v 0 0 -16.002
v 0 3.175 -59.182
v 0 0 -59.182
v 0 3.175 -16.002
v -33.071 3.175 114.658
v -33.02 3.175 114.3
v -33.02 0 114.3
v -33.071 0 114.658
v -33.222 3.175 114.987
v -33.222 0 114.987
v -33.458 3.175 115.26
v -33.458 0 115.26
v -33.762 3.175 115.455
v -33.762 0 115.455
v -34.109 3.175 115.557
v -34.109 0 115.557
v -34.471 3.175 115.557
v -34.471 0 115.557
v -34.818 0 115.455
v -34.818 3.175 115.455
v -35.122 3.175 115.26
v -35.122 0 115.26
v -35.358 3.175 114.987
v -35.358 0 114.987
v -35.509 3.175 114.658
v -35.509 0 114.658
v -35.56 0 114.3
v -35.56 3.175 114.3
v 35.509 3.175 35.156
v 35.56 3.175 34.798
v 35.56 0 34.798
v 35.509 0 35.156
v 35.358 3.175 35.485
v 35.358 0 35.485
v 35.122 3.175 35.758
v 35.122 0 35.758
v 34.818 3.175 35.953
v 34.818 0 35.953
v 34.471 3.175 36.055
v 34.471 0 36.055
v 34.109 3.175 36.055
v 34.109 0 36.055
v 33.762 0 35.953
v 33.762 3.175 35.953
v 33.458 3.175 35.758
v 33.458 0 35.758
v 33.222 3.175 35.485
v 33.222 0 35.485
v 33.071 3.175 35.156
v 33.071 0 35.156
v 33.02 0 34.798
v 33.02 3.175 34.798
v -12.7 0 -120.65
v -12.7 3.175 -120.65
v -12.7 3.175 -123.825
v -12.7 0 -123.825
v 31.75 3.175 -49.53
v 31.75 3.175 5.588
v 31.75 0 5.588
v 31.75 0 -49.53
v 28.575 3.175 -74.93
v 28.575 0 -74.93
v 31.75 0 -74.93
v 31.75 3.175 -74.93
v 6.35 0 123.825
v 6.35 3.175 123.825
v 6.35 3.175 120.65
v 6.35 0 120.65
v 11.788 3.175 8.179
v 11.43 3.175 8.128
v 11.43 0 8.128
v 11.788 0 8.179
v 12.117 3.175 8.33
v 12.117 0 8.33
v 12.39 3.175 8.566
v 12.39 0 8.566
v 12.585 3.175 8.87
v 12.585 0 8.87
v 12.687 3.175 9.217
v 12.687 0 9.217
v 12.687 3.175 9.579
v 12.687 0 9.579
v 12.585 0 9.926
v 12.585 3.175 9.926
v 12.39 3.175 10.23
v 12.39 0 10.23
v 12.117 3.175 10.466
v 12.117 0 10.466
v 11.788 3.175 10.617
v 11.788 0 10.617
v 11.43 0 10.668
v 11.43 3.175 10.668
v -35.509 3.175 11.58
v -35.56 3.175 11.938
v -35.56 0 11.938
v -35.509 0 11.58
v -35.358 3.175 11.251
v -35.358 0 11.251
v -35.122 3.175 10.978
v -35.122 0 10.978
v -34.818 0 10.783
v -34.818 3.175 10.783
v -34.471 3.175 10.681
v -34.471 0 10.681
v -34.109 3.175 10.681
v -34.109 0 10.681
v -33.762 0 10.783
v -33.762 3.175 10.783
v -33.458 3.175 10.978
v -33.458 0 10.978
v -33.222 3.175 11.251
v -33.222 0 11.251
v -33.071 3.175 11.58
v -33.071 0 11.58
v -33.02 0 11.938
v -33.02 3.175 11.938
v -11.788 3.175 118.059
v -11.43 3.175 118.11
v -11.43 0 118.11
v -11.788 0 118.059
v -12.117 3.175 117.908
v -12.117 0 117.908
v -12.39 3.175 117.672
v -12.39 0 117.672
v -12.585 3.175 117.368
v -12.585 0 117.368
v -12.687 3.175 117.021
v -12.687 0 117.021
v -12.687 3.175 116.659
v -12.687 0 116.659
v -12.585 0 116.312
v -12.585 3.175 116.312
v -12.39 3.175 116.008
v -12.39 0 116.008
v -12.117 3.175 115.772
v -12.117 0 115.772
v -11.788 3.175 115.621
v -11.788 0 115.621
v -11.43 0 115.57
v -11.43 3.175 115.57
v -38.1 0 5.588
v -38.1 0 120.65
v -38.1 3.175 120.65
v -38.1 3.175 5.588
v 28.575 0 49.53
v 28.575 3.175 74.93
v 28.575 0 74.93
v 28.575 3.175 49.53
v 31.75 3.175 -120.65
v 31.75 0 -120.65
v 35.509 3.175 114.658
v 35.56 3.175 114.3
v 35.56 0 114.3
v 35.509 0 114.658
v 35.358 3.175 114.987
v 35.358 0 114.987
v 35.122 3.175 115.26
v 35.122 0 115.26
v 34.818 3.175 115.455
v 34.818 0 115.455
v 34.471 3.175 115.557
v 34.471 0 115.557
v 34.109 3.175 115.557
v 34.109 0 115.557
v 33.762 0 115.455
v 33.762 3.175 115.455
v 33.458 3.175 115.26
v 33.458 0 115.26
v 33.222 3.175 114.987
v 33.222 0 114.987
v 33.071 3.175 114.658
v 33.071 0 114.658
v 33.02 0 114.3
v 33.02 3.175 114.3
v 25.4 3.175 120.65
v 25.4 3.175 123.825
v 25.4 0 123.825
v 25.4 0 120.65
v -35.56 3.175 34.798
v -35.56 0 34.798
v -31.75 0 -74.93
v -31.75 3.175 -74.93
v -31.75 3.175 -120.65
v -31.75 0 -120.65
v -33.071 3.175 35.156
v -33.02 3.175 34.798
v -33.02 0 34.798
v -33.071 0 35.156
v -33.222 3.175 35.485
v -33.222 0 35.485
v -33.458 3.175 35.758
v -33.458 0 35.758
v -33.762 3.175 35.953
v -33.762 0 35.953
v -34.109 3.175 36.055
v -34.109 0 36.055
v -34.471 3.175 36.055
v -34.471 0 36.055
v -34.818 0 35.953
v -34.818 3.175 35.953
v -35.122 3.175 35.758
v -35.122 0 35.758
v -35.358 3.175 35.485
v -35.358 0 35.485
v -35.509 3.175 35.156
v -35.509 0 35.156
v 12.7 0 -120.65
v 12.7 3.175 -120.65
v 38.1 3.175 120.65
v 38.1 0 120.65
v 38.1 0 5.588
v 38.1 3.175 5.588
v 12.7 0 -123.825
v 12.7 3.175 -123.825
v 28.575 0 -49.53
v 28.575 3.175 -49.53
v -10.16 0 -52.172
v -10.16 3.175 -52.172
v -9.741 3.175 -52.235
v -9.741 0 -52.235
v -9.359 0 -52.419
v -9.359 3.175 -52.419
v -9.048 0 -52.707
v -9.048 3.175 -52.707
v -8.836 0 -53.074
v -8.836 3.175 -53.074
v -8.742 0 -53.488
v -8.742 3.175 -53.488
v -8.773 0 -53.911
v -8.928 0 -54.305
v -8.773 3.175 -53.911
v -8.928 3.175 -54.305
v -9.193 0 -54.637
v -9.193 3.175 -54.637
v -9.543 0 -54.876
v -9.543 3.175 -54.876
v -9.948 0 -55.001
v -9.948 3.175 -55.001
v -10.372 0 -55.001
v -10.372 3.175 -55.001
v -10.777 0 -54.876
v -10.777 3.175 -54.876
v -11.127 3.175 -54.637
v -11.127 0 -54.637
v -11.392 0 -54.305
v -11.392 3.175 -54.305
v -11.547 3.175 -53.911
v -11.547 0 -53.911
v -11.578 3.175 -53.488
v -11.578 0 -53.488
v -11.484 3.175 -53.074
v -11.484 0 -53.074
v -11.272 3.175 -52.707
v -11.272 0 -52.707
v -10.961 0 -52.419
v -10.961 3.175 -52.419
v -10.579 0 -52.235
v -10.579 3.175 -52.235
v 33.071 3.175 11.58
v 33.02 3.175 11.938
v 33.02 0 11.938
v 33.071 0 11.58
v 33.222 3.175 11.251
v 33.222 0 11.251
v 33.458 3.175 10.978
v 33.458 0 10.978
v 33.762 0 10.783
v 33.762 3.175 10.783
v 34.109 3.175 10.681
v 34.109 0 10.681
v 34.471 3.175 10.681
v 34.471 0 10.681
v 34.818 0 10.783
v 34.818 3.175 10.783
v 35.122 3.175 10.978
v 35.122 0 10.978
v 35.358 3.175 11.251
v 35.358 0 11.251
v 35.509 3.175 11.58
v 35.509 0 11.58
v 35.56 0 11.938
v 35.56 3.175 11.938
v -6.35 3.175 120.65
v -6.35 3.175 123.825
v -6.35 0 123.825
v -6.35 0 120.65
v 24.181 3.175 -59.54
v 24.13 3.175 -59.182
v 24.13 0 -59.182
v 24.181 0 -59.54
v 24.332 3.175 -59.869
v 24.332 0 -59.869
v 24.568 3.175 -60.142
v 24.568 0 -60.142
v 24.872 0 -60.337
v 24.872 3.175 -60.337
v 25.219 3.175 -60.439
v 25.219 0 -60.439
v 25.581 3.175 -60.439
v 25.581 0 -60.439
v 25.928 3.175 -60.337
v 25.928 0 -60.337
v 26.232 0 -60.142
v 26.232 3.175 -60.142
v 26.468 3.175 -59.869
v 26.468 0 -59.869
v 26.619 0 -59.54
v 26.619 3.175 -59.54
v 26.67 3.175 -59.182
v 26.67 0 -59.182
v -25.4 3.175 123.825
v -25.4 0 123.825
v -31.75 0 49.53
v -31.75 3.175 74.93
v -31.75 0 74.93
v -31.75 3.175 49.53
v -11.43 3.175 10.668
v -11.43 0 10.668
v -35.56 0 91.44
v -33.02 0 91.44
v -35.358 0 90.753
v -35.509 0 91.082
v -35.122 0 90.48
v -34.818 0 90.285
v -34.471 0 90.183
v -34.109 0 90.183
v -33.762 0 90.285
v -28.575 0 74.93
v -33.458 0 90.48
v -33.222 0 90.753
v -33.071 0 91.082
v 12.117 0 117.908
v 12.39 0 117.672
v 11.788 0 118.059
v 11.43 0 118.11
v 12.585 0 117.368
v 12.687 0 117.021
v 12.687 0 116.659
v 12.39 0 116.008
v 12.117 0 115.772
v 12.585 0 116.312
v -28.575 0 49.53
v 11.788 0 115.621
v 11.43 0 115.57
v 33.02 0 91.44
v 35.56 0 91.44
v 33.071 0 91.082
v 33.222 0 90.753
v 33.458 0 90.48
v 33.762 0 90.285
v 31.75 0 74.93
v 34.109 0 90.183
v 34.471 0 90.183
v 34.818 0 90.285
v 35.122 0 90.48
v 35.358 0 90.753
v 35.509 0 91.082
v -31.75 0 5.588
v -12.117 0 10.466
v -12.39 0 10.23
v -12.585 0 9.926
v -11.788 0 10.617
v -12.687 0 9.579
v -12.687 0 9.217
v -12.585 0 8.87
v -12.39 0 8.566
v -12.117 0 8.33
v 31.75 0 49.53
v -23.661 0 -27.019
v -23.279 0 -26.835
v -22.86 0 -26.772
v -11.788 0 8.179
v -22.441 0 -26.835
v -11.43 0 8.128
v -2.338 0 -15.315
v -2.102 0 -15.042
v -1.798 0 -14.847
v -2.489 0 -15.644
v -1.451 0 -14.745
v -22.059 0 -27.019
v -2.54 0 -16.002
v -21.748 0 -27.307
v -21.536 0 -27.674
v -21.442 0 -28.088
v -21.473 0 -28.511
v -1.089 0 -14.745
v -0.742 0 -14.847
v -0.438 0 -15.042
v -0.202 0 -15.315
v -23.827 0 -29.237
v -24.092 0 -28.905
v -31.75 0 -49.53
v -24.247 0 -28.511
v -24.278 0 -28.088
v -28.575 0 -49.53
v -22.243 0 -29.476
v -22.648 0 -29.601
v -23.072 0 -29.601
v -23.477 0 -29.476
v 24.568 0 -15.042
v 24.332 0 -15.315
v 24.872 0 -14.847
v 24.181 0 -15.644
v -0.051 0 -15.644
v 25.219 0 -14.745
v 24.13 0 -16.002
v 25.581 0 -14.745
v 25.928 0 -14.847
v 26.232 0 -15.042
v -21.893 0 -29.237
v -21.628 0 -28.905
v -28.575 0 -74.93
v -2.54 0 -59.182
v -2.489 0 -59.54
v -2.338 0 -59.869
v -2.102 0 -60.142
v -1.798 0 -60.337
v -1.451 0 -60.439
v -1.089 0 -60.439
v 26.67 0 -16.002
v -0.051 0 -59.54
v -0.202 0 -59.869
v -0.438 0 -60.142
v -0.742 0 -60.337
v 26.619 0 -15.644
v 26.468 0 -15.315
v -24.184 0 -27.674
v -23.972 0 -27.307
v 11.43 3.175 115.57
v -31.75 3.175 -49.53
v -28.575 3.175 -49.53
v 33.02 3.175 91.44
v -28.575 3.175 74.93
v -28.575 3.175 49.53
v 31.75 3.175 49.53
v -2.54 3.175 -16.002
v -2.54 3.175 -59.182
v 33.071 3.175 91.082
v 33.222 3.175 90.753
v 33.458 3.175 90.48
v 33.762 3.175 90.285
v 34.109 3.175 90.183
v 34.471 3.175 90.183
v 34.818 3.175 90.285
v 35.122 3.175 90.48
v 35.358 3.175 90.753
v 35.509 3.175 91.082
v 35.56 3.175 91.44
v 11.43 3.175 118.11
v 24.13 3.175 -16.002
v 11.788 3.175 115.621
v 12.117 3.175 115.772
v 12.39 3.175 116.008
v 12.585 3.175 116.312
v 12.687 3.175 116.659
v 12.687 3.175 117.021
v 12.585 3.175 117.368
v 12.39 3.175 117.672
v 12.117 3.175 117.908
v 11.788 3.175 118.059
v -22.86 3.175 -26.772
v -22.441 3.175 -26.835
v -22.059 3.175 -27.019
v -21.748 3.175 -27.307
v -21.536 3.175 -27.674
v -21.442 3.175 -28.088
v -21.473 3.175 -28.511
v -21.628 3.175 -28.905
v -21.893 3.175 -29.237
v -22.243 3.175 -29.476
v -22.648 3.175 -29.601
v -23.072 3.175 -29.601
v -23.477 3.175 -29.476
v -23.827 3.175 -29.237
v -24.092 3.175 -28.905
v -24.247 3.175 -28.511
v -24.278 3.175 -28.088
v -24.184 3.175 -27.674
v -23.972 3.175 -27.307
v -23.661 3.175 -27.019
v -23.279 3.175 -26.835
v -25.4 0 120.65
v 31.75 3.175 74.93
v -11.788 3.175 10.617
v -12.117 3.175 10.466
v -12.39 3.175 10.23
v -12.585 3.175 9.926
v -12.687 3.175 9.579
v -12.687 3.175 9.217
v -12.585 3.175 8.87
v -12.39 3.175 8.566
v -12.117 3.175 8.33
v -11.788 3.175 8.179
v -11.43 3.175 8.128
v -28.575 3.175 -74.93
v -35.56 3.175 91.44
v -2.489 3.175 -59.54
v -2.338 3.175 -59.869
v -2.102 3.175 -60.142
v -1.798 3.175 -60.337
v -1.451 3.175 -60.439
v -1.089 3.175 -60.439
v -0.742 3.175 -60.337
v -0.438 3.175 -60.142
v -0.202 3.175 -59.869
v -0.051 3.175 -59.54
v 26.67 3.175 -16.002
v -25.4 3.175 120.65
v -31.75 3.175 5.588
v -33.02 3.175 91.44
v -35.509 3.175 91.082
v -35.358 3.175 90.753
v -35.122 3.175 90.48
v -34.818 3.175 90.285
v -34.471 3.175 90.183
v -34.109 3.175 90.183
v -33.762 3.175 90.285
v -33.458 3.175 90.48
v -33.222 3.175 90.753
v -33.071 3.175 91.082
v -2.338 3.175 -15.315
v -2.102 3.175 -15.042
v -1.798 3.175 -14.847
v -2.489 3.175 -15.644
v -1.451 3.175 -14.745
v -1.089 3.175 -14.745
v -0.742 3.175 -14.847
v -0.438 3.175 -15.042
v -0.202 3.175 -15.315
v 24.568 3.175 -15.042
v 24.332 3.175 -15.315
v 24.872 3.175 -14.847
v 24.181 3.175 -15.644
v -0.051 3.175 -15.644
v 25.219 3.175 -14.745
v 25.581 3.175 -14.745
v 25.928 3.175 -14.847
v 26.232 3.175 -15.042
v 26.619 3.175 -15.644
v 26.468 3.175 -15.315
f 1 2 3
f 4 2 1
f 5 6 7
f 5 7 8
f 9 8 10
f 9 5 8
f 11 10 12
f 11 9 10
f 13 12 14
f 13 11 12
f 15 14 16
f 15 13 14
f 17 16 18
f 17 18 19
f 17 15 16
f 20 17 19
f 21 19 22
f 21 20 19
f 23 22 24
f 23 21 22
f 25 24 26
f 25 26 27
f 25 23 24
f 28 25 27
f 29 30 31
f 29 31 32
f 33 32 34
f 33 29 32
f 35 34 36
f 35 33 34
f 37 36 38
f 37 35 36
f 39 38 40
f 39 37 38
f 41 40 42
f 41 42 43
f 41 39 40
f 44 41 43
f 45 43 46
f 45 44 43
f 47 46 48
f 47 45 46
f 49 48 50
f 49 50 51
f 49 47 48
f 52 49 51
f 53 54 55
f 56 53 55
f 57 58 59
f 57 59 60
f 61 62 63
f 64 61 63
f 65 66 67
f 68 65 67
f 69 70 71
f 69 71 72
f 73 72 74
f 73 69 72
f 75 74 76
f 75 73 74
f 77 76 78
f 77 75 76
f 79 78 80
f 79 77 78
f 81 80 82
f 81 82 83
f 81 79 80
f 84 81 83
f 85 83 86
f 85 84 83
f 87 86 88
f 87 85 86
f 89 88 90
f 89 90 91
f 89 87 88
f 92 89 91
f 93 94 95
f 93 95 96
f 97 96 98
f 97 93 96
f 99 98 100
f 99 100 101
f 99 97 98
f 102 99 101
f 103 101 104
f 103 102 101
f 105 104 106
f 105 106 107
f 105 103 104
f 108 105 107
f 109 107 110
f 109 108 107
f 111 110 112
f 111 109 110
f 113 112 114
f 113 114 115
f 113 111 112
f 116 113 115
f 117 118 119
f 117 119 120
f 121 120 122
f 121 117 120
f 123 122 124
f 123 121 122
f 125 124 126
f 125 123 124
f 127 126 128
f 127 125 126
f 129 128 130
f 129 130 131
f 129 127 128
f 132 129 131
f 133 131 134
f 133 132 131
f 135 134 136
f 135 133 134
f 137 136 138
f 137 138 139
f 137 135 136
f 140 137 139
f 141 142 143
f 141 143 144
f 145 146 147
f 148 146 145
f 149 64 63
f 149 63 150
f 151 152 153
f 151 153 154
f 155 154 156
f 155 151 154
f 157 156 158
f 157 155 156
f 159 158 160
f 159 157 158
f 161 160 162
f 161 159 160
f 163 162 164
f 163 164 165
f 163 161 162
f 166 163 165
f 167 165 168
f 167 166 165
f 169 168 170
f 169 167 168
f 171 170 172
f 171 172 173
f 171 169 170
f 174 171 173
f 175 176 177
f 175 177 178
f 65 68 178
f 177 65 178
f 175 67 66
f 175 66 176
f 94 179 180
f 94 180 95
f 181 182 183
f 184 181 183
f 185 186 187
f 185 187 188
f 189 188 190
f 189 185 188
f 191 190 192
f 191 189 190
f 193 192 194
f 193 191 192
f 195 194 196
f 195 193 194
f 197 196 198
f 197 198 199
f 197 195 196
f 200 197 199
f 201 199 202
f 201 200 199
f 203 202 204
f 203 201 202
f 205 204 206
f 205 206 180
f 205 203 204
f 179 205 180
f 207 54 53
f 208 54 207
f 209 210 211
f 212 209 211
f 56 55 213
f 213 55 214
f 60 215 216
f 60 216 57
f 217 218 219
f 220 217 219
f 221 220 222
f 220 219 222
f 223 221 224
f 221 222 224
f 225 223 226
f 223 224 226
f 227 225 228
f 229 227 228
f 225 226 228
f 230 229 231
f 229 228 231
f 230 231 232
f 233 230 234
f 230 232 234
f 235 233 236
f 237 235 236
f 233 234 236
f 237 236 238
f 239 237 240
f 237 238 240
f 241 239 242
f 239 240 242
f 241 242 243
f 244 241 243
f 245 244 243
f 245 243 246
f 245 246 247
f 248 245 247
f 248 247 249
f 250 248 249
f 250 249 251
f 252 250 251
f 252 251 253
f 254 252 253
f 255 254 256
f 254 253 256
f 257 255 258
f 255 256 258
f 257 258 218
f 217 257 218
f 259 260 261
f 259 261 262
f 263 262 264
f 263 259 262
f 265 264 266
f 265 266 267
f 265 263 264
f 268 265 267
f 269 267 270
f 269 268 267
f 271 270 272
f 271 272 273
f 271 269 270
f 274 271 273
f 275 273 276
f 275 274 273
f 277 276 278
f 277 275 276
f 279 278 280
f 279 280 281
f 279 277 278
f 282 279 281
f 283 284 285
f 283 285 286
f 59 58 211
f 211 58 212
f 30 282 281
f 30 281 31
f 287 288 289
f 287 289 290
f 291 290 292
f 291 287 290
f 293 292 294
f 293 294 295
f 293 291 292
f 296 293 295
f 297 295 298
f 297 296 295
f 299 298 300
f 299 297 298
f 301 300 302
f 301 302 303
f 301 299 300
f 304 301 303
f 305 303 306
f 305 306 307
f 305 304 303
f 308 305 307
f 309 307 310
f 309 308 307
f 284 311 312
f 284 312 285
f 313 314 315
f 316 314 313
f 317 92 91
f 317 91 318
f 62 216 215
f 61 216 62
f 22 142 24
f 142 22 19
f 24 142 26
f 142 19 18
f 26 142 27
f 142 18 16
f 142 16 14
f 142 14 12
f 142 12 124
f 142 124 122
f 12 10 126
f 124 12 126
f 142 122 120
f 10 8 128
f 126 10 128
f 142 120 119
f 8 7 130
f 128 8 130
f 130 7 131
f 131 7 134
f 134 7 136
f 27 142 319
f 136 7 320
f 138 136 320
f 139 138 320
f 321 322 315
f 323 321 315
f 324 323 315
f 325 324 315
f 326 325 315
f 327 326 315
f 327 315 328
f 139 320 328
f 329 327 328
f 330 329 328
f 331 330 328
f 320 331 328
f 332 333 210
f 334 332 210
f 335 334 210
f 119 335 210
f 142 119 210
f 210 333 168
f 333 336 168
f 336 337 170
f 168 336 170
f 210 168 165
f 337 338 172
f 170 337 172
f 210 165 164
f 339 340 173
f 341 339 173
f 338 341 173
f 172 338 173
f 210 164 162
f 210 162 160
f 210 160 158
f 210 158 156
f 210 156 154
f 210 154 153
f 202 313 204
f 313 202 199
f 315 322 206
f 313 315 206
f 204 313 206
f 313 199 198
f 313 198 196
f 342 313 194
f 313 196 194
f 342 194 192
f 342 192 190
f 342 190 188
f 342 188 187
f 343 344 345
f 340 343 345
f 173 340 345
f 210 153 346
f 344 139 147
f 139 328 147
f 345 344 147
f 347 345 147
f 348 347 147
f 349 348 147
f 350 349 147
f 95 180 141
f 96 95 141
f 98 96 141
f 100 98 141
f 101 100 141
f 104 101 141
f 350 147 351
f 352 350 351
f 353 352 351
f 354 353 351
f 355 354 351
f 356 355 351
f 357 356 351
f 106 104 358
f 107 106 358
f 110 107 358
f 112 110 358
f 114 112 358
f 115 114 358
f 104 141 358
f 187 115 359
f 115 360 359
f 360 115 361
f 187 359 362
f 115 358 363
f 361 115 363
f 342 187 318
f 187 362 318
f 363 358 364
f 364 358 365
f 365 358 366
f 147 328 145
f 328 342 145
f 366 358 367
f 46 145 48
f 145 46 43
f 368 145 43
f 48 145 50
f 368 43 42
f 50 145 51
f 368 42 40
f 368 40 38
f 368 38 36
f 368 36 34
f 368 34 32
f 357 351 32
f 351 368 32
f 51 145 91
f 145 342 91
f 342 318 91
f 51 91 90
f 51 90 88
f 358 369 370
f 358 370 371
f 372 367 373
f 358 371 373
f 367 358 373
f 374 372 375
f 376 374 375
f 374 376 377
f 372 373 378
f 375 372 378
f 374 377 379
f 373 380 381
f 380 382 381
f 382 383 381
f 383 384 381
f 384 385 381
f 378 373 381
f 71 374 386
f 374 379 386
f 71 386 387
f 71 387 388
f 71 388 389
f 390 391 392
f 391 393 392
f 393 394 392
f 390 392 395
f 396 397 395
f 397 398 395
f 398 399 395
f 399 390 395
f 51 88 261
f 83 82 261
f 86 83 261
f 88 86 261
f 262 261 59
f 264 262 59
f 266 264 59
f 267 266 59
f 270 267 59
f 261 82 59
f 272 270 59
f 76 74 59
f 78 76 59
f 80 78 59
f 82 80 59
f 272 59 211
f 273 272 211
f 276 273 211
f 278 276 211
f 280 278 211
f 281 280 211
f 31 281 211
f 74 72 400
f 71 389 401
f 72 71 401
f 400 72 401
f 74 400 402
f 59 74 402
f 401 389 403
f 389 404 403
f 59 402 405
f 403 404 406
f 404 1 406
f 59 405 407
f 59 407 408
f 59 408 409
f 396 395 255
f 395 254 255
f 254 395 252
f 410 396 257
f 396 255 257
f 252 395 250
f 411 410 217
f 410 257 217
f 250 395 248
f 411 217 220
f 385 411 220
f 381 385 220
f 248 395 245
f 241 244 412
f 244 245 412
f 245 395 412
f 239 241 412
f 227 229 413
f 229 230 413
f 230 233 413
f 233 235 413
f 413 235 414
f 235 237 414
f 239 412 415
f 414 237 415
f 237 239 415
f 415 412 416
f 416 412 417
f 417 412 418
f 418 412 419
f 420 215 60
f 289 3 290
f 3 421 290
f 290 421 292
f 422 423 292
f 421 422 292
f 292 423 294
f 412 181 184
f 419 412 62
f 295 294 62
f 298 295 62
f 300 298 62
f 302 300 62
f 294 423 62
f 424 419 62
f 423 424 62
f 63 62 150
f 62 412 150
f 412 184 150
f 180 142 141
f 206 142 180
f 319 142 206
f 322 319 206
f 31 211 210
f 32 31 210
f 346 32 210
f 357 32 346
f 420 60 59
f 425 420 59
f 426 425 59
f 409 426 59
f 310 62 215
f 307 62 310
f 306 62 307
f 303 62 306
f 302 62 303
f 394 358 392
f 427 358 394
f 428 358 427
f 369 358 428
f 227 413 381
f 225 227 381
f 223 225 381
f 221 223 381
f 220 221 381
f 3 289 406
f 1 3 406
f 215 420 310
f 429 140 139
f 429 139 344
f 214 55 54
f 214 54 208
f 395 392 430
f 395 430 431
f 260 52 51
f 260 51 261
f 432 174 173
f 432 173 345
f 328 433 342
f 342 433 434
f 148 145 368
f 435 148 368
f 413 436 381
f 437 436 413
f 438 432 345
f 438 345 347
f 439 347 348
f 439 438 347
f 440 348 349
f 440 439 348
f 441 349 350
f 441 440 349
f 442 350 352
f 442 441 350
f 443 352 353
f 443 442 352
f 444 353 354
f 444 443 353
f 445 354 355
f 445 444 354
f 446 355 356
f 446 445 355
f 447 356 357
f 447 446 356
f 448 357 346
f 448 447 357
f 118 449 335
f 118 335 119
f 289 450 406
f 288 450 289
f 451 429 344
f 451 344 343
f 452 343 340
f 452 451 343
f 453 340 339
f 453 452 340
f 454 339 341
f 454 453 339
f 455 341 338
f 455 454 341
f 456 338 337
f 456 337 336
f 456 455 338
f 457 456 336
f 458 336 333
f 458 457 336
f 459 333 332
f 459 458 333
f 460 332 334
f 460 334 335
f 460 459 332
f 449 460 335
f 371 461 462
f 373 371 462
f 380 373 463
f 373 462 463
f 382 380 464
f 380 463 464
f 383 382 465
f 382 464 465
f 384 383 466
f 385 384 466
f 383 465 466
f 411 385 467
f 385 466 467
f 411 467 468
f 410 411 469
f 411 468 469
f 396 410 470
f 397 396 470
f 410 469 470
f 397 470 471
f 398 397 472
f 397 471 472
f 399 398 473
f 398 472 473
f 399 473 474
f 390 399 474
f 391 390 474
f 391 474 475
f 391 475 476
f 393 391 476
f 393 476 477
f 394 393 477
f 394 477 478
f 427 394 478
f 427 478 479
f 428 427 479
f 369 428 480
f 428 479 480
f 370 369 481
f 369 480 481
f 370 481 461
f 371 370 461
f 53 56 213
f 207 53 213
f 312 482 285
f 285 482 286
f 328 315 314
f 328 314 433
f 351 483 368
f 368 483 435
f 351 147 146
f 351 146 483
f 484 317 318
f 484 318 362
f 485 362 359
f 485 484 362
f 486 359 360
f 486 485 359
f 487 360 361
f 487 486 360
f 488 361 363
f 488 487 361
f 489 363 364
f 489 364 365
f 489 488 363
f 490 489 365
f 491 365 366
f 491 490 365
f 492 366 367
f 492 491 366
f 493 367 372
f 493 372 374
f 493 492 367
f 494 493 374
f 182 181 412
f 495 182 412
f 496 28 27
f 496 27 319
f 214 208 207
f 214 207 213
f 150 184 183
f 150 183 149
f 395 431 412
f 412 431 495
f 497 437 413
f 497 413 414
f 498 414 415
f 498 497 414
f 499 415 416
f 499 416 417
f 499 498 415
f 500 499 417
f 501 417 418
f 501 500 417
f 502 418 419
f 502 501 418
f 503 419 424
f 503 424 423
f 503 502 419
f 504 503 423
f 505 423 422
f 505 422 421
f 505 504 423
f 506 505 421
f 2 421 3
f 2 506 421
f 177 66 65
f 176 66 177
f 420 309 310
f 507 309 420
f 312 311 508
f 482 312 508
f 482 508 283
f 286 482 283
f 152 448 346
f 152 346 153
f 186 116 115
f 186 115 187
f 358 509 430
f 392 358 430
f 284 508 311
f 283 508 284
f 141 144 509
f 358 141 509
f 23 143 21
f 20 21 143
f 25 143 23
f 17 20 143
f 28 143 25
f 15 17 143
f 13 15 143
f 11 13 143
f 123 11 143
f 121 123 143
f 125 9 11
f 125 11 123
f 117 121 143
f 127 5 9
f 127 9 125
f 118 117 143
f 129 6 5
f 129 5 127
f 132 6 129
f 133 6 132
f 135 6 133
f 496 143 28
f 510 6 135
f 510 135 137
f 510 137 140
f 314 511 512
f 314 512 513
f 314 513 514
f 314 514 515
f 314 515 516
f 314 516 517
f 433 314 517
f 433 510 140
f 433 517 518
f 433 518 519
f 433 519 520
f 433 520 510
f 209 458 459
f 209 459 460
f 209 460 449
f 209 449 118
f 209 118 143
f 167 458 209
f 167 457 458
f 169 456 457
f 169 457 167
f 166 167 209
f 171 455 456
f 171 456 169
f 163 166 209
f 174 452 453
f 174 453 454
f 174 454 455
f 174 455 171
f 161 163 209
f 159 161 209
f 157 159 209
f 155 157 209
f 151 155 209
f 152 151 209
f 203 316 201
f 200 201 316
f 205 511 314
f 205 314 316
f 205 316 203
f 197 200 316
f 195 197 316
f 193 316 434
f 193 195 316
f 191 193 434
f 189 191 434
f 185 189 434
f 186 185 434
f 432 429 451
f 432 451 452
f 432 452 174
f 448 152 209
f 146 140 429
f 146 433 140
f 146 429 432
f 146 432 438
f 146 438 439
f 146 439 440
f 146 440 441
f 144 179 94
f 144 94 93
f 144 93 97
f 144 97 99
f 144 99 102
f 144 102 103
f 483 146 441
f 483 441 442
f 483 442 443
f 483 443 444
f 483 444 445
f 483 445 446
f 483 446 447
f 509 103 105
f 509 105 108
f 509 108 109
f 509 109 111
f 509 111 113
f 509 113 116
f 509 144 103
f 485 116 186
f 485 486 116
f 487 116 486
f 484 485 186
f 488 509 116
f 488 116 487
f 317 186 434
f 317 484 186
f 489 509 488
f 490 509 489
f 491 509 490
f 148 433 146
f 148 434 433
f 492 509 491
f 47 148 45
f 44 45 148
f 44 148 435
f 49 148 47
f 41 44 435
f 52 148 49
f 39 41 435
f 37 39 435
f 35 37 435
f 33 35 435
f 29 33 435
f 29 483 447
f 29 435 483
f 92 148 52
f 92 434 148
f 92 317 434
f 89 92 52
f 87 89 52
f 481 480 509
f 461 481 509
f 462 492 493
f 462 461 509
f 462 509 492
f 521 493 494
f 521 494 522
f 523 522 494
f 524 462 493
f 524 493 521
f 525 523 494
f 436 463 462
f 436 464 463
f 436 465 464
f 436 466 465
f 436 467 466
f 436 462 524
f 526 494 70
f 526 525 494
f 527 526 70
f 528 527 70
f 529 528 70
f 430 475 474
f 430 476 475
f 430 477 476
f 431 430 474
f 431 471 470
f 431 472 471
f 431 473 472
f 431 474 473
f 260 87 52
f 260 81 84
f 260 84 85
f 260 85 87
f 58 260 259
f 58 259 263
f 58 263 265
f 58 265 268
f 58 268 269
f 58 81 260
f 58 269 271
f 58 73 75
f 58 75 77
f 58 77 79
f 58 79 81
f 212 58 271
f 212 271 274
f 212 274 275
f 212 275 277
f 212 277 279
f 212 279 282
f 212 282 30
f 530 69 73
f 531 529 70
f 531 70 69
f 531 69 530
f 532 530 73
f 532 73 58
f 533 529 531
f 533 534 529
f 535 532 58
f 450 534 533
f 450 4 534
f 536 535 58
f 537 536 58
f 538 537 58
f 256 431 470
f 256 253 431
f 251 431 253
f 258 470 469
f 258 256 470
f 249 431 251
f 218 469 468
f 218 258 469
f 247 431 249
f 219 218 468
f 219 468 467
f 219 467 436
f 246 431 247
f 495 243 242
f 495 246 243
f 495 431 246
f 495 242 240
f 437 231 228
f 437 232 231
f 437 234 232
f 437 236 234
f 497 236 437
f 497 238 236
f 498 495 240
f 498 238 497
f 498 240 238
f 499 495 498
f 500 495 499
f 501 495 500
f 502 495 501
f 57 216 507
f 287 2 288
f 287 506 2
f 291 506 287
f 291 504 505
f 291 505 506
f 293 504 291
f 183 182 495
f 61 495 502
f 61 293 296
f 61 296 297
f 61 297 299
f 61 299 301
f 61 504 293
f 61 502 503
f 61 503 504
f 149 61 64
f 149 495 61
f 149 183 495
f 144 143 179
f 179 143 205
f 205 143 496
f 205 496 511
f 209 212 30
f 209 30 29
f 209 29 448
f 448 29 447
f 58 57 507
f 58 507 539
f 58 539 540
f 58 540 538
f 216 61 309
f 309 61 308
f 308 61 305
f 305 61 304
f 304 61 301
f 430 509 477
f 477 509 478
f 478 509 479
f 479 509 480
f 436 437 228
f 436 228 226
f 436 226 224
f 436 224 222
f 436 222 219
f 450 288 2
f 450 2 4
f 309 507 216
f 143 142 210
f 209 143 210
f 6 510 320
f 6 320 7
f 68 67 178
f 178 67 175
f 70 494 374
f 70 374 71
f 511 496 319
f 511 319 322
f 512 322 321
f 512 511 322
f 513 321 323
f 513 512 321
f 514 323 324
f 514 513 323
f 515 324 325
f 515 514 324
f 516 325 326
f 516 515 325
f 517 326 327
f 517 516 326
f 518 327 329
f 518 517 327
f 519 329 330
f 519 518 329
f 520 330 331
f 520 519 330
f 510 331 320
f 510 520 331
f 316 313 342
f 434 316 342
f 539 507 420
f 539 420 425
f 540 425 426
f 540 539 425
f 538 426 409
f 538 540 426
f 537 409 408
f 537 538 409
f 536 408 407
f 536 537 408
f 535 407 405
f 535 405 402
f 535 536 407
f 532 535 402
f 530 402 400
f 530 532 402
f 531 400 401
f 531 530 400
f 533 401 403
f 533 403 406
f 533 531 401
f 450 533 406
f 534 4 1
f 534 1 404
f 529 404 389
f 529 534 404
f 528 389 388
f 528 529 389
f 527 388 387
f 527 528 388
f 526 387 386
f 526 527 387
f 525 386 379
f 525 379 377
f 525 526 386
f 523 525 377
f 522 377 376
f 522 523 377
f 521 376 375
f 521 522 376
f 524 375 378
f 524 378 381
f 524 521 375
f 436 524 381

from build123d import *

# Parameters (mm, degrees)
SKETCH1_W             = 76.2
SKETCH1_H             = 241.3
BOSS_EXTRUDE1_DEPTH   = 3.175
SKETCH5_W             = 6.35
SKETCH5_H             = 126.238
CUT_EXTRUDE11_DEPTH   = 3.175
SKETCH5_4_W           = 6.35
SKETCH5_4_H           = 126.238
CUT_EXTRUDE12_DEPTH   = 3.175
SKETCH7_W             = 3.175
SKETCH7_H             = 25.4
CUT_EXTRUDE13_DEPTH   = 3.175
SKETCH7_3_W           = 3.175
SKETCH7_3_H           = 25.4
CUT_EXTRUDE14_DEPTH   = 3.175
SKETCH8_W             = 19.05
SKETCH8_H             = 3.175
BOSS_EXTRUDE2_DEPTH   = 3.175
BOSS_EXTRUDE2_2_DEPTH = 3.175
SKETCH8_W_2           = 25.4
BOSS_EXTRUDE2_3_DEPTH = 3.175
CUT_EXTRUDE15_DEPTH   = 3.175
SKETCH10_R            = 1.4224
CUT_EXTRUDE16_DEPTH   = 3.175


with BuildPart() as part:
    # Sketch1 → Boss-Extrude1 (new body)
    with BuildSketch(Plane(origin=(0, 0, 0), x_dir=(1, 0, 0), z_dir=(0, 1, 0))):
        Rectangle(SKETCH1_W, SKETCH1_H)
    extrude(amount=BOSS_EXTRUDE1_DEPTH)

    # Sketch5 → Cut-Extrude11 (cut)
    with BuildSketch(Plane(origin=(0, 3.175, 0), x_dir=(1, 0, 0), z_dir=(0, 1, 0))):
        with Locations((-34.925, 57.531)):
            Rectangle(SKETCH5_W, SKETCH5_H)
    extrude(amount=-CUT_EXTRUDE11_DEPTH, mode=Mode.SUBTRACT)

    # Sketch5<4> → Cut-Extrude12 (cut)
    with BuildSketch(Plane(origin=(0, 3.175, 0), x_dir=(1, 0, 0), z_dir=(0, 1, 0))):
        with Locations((34.925, 57.531)):
            Rectangle(SKETCH5_4_W, SKETCH5_4_H)
    extrude(amount=-CUT_EXTRUDE12_DEPTH, mode=Mode.SUBTRACT)

    # Sketch7 → Cut-Extrude13 (cut)
    with BuildSketch(Plane(origin=(0, 3.175, 0), x_dir=(1, 0, 0), z_dir=(0, 1, 0))):
        with Locations((-30.1625, -62.23)):
            Rectangle(SKETCH7_W, SKETCH7_H)
    extrude(amount=-CUT_EXTRUDE13_DEPTH, mode=Mode.SUBTRACT)

    # Sketch7<3> → Cut-Extrude14 (cut)
    with BuildSketch(Plane(origin=(0, 3.175, 0), x_dir=(1, 0, 0), z_dir=(0, 1, 0))):
        with Locations((-30.1625, -62.23)):
            Rectangle(SKETCH7_3_W, SKETCH7_3_H)
        with Locations((30.1625, -62.23)):
            Rectangle(SKETCH7_3_W, SKETCH7_3_H)
        with Locations((-30.1625, 62.23)):
            Rectangle(SKETCH7_3_W, SKETCH7_3_H)
        with Locations((30.1625, 62.23)):
            Rectangle(SKETCH7_3_W, SKETCH7_3_H)
    extrude(amount=-CUT_EXTRUDE14_DEPTH, mode=Mode.SUBTRACT)

    # Sketch9 → Cut-Extrude15 (cut)
    with BuildSketch(Plane(origin=(0, 3.175, 0), x_dir=(1, 0, 0), z_dir=(0, 1, 0))):
        with BuildLine():
            Line((-11.43, -115.57), (11.43, -115.57))
            ThreePointArc((11.43, -115.57), (12.7, -116.84), (11.43, -118.11))
            Line((11.43, -118.11), (-11.43, -118.11))
            ThreePointArc((-11.43, -118.11), (-12.7, -116.84), (-11.43, -115.57))
        make_face()
        with BuildLine():
            Line((-11.43, -8.128), (11.43, -8.128))
            ThreePointArc((11.43, -8.128), (12.7, -9.398), (11.43, -10.668))
            Line((11.43, -10.668), (-11.43, -10.668))
            ThreePointArc((-11.43, -10.668), (-12.7, -9.398), (-11.43, -8.128))
        make_face()
        with BuildLine():
            Line((-35.56, -114.3), (-35.56, -91.44))
            ThreePointArc((-35.56, -91.44), (-34.29, -90.17), (-33.02, -91.44))
            Line((-33.02, -91.44), (-33.02, -114.3))
            ThreePointArc((-33.02, -114.3), (-34.29, -115.57), (-35.56, -114.3))
        make_face()
        with BuildLine():
            Line((33.02, -114.3), (33.02, -91.44))
            ThreePointArc((33.02, -91.44), (34.29, -90.17), (35.56, -91.44))
            Line((35.56, -91.44), (35.56, -114.3))
            ThreePointArc((35.56, -114.3), (34.29, -115.57), (33.02, -114.3))
        make_face()
        with BuildLine():
            Line((33.02, -34.798), (33.02, -11.938))
            ThreePointArc((33.02, -11.938), (34.29, -10.668), (35.56, -11.938))
            Line((35.56, -11.938), (35.56, -34.798))
            ThreePointArc((35.56, -34.798), (34.29, -36.068), (33.02, -34.798))
        make_face()
        with BuildLine():
            Line((-35.56, -34.798), (-35.56, -11.938))
            ThreePointArc((-35.56, -11.938), (-34.29, -10.668), (-33.02, -11.938))
            Line((-33.02, -11.938), (-33.02, -34.798))
            ThreePointArc((-33.02, -34.798), (-34.29, -36.068), (-35.56, -34.798))
        make_face()
    extrude(amount=-CUT_EXTRUDE15_DEPTH, mode=Mode.SUBTRACT)

    # Sketch10 → Cut-Extrude16 (cut)
    with BuildSketch(Plane(origin=(0, 3.175, 0), x_dir=(1, 0, 0), z_dir=(0, 1, 0))):
        with Locations((-22.86, 28.194)):
            Circle(SKETCH10_R)
        with Locations((-10.16, 53.594)):
            Circle(SKETCH10_R)
        with BuildLine():
            Line((-2.54, 16.002), (-2.54, 59.182))
            ThreePointArc((-2.54, 59.182), (-1.27, 60.452), (0, 59.182))
            Line((0, 59.182), (0, 16.002))
            ThreePointArc((0, 16.002), (-1.27, 14.732), (-2.54, 16.002))
        make_face()
        with BuildLine():
            Line((24.13, 16.002), (24.13, 59.182))
            ThreePointArc((24.13, 59.182), (25.4, 60.452), (26.67, 59.182))
            Line((26.67, 59.182), (26.67, 16.002))
            ThreePointArc((26.67, 16.002), (25.4, 14.732), (24.13, 16.002))
        make_face()
    extrude(amount=-CUT_EXTRUDE16_DEPTH, mode=Mode.SUBTRACT)


with BuildPart() as body_2:
    # Sketch8 → Boss-Extrude2 (new body)
    with BuildSketch(Plane(origin=(0, 3.175, 0), x_dir=(1, 0, 0), z_dir=(0, 1, 0))):
        with Locations((-15.875, -122.2375)):
            Rectangle(SKETCH8_W, SKETCH8_H)
    extrude(amount=-BOSS_EXTRUDE2_DEPTH)


with BuildPart() as body_3:
    # Sketch8 → Boss-Extrude2 2 (new body)
    with BuildSketch(Plane(origin=(0, 3.175, 0), x_dir=(1, 0, 0), z_dir=(0, 1, 0))):
        with Locations((15.875, -122.2375)):
            Rectangle(SKETCH8_W, SKETCH8_H)
    extrude(amount=-BOSS_EXTRUDE2_2_DEPTH)


with BuildPart() as body_4:
    # Sketch8 → Boss-Extrude2 3 (new body)
    with BuildSketch(Plane(origin=(0, 3.175, 0), x_dir=(1, 0, 0), z_dir=(0, 1, 0))):
        with Locations((0, 122.2375)):
            Rectangle(SKETCH8_W_2, SKETCH8_H)
    extrude(amount=-BOSS_EXTRUDE2_3_DEPTH)


solid = Compound([part.part, body_2.part, body_3.part, body_4.part])
